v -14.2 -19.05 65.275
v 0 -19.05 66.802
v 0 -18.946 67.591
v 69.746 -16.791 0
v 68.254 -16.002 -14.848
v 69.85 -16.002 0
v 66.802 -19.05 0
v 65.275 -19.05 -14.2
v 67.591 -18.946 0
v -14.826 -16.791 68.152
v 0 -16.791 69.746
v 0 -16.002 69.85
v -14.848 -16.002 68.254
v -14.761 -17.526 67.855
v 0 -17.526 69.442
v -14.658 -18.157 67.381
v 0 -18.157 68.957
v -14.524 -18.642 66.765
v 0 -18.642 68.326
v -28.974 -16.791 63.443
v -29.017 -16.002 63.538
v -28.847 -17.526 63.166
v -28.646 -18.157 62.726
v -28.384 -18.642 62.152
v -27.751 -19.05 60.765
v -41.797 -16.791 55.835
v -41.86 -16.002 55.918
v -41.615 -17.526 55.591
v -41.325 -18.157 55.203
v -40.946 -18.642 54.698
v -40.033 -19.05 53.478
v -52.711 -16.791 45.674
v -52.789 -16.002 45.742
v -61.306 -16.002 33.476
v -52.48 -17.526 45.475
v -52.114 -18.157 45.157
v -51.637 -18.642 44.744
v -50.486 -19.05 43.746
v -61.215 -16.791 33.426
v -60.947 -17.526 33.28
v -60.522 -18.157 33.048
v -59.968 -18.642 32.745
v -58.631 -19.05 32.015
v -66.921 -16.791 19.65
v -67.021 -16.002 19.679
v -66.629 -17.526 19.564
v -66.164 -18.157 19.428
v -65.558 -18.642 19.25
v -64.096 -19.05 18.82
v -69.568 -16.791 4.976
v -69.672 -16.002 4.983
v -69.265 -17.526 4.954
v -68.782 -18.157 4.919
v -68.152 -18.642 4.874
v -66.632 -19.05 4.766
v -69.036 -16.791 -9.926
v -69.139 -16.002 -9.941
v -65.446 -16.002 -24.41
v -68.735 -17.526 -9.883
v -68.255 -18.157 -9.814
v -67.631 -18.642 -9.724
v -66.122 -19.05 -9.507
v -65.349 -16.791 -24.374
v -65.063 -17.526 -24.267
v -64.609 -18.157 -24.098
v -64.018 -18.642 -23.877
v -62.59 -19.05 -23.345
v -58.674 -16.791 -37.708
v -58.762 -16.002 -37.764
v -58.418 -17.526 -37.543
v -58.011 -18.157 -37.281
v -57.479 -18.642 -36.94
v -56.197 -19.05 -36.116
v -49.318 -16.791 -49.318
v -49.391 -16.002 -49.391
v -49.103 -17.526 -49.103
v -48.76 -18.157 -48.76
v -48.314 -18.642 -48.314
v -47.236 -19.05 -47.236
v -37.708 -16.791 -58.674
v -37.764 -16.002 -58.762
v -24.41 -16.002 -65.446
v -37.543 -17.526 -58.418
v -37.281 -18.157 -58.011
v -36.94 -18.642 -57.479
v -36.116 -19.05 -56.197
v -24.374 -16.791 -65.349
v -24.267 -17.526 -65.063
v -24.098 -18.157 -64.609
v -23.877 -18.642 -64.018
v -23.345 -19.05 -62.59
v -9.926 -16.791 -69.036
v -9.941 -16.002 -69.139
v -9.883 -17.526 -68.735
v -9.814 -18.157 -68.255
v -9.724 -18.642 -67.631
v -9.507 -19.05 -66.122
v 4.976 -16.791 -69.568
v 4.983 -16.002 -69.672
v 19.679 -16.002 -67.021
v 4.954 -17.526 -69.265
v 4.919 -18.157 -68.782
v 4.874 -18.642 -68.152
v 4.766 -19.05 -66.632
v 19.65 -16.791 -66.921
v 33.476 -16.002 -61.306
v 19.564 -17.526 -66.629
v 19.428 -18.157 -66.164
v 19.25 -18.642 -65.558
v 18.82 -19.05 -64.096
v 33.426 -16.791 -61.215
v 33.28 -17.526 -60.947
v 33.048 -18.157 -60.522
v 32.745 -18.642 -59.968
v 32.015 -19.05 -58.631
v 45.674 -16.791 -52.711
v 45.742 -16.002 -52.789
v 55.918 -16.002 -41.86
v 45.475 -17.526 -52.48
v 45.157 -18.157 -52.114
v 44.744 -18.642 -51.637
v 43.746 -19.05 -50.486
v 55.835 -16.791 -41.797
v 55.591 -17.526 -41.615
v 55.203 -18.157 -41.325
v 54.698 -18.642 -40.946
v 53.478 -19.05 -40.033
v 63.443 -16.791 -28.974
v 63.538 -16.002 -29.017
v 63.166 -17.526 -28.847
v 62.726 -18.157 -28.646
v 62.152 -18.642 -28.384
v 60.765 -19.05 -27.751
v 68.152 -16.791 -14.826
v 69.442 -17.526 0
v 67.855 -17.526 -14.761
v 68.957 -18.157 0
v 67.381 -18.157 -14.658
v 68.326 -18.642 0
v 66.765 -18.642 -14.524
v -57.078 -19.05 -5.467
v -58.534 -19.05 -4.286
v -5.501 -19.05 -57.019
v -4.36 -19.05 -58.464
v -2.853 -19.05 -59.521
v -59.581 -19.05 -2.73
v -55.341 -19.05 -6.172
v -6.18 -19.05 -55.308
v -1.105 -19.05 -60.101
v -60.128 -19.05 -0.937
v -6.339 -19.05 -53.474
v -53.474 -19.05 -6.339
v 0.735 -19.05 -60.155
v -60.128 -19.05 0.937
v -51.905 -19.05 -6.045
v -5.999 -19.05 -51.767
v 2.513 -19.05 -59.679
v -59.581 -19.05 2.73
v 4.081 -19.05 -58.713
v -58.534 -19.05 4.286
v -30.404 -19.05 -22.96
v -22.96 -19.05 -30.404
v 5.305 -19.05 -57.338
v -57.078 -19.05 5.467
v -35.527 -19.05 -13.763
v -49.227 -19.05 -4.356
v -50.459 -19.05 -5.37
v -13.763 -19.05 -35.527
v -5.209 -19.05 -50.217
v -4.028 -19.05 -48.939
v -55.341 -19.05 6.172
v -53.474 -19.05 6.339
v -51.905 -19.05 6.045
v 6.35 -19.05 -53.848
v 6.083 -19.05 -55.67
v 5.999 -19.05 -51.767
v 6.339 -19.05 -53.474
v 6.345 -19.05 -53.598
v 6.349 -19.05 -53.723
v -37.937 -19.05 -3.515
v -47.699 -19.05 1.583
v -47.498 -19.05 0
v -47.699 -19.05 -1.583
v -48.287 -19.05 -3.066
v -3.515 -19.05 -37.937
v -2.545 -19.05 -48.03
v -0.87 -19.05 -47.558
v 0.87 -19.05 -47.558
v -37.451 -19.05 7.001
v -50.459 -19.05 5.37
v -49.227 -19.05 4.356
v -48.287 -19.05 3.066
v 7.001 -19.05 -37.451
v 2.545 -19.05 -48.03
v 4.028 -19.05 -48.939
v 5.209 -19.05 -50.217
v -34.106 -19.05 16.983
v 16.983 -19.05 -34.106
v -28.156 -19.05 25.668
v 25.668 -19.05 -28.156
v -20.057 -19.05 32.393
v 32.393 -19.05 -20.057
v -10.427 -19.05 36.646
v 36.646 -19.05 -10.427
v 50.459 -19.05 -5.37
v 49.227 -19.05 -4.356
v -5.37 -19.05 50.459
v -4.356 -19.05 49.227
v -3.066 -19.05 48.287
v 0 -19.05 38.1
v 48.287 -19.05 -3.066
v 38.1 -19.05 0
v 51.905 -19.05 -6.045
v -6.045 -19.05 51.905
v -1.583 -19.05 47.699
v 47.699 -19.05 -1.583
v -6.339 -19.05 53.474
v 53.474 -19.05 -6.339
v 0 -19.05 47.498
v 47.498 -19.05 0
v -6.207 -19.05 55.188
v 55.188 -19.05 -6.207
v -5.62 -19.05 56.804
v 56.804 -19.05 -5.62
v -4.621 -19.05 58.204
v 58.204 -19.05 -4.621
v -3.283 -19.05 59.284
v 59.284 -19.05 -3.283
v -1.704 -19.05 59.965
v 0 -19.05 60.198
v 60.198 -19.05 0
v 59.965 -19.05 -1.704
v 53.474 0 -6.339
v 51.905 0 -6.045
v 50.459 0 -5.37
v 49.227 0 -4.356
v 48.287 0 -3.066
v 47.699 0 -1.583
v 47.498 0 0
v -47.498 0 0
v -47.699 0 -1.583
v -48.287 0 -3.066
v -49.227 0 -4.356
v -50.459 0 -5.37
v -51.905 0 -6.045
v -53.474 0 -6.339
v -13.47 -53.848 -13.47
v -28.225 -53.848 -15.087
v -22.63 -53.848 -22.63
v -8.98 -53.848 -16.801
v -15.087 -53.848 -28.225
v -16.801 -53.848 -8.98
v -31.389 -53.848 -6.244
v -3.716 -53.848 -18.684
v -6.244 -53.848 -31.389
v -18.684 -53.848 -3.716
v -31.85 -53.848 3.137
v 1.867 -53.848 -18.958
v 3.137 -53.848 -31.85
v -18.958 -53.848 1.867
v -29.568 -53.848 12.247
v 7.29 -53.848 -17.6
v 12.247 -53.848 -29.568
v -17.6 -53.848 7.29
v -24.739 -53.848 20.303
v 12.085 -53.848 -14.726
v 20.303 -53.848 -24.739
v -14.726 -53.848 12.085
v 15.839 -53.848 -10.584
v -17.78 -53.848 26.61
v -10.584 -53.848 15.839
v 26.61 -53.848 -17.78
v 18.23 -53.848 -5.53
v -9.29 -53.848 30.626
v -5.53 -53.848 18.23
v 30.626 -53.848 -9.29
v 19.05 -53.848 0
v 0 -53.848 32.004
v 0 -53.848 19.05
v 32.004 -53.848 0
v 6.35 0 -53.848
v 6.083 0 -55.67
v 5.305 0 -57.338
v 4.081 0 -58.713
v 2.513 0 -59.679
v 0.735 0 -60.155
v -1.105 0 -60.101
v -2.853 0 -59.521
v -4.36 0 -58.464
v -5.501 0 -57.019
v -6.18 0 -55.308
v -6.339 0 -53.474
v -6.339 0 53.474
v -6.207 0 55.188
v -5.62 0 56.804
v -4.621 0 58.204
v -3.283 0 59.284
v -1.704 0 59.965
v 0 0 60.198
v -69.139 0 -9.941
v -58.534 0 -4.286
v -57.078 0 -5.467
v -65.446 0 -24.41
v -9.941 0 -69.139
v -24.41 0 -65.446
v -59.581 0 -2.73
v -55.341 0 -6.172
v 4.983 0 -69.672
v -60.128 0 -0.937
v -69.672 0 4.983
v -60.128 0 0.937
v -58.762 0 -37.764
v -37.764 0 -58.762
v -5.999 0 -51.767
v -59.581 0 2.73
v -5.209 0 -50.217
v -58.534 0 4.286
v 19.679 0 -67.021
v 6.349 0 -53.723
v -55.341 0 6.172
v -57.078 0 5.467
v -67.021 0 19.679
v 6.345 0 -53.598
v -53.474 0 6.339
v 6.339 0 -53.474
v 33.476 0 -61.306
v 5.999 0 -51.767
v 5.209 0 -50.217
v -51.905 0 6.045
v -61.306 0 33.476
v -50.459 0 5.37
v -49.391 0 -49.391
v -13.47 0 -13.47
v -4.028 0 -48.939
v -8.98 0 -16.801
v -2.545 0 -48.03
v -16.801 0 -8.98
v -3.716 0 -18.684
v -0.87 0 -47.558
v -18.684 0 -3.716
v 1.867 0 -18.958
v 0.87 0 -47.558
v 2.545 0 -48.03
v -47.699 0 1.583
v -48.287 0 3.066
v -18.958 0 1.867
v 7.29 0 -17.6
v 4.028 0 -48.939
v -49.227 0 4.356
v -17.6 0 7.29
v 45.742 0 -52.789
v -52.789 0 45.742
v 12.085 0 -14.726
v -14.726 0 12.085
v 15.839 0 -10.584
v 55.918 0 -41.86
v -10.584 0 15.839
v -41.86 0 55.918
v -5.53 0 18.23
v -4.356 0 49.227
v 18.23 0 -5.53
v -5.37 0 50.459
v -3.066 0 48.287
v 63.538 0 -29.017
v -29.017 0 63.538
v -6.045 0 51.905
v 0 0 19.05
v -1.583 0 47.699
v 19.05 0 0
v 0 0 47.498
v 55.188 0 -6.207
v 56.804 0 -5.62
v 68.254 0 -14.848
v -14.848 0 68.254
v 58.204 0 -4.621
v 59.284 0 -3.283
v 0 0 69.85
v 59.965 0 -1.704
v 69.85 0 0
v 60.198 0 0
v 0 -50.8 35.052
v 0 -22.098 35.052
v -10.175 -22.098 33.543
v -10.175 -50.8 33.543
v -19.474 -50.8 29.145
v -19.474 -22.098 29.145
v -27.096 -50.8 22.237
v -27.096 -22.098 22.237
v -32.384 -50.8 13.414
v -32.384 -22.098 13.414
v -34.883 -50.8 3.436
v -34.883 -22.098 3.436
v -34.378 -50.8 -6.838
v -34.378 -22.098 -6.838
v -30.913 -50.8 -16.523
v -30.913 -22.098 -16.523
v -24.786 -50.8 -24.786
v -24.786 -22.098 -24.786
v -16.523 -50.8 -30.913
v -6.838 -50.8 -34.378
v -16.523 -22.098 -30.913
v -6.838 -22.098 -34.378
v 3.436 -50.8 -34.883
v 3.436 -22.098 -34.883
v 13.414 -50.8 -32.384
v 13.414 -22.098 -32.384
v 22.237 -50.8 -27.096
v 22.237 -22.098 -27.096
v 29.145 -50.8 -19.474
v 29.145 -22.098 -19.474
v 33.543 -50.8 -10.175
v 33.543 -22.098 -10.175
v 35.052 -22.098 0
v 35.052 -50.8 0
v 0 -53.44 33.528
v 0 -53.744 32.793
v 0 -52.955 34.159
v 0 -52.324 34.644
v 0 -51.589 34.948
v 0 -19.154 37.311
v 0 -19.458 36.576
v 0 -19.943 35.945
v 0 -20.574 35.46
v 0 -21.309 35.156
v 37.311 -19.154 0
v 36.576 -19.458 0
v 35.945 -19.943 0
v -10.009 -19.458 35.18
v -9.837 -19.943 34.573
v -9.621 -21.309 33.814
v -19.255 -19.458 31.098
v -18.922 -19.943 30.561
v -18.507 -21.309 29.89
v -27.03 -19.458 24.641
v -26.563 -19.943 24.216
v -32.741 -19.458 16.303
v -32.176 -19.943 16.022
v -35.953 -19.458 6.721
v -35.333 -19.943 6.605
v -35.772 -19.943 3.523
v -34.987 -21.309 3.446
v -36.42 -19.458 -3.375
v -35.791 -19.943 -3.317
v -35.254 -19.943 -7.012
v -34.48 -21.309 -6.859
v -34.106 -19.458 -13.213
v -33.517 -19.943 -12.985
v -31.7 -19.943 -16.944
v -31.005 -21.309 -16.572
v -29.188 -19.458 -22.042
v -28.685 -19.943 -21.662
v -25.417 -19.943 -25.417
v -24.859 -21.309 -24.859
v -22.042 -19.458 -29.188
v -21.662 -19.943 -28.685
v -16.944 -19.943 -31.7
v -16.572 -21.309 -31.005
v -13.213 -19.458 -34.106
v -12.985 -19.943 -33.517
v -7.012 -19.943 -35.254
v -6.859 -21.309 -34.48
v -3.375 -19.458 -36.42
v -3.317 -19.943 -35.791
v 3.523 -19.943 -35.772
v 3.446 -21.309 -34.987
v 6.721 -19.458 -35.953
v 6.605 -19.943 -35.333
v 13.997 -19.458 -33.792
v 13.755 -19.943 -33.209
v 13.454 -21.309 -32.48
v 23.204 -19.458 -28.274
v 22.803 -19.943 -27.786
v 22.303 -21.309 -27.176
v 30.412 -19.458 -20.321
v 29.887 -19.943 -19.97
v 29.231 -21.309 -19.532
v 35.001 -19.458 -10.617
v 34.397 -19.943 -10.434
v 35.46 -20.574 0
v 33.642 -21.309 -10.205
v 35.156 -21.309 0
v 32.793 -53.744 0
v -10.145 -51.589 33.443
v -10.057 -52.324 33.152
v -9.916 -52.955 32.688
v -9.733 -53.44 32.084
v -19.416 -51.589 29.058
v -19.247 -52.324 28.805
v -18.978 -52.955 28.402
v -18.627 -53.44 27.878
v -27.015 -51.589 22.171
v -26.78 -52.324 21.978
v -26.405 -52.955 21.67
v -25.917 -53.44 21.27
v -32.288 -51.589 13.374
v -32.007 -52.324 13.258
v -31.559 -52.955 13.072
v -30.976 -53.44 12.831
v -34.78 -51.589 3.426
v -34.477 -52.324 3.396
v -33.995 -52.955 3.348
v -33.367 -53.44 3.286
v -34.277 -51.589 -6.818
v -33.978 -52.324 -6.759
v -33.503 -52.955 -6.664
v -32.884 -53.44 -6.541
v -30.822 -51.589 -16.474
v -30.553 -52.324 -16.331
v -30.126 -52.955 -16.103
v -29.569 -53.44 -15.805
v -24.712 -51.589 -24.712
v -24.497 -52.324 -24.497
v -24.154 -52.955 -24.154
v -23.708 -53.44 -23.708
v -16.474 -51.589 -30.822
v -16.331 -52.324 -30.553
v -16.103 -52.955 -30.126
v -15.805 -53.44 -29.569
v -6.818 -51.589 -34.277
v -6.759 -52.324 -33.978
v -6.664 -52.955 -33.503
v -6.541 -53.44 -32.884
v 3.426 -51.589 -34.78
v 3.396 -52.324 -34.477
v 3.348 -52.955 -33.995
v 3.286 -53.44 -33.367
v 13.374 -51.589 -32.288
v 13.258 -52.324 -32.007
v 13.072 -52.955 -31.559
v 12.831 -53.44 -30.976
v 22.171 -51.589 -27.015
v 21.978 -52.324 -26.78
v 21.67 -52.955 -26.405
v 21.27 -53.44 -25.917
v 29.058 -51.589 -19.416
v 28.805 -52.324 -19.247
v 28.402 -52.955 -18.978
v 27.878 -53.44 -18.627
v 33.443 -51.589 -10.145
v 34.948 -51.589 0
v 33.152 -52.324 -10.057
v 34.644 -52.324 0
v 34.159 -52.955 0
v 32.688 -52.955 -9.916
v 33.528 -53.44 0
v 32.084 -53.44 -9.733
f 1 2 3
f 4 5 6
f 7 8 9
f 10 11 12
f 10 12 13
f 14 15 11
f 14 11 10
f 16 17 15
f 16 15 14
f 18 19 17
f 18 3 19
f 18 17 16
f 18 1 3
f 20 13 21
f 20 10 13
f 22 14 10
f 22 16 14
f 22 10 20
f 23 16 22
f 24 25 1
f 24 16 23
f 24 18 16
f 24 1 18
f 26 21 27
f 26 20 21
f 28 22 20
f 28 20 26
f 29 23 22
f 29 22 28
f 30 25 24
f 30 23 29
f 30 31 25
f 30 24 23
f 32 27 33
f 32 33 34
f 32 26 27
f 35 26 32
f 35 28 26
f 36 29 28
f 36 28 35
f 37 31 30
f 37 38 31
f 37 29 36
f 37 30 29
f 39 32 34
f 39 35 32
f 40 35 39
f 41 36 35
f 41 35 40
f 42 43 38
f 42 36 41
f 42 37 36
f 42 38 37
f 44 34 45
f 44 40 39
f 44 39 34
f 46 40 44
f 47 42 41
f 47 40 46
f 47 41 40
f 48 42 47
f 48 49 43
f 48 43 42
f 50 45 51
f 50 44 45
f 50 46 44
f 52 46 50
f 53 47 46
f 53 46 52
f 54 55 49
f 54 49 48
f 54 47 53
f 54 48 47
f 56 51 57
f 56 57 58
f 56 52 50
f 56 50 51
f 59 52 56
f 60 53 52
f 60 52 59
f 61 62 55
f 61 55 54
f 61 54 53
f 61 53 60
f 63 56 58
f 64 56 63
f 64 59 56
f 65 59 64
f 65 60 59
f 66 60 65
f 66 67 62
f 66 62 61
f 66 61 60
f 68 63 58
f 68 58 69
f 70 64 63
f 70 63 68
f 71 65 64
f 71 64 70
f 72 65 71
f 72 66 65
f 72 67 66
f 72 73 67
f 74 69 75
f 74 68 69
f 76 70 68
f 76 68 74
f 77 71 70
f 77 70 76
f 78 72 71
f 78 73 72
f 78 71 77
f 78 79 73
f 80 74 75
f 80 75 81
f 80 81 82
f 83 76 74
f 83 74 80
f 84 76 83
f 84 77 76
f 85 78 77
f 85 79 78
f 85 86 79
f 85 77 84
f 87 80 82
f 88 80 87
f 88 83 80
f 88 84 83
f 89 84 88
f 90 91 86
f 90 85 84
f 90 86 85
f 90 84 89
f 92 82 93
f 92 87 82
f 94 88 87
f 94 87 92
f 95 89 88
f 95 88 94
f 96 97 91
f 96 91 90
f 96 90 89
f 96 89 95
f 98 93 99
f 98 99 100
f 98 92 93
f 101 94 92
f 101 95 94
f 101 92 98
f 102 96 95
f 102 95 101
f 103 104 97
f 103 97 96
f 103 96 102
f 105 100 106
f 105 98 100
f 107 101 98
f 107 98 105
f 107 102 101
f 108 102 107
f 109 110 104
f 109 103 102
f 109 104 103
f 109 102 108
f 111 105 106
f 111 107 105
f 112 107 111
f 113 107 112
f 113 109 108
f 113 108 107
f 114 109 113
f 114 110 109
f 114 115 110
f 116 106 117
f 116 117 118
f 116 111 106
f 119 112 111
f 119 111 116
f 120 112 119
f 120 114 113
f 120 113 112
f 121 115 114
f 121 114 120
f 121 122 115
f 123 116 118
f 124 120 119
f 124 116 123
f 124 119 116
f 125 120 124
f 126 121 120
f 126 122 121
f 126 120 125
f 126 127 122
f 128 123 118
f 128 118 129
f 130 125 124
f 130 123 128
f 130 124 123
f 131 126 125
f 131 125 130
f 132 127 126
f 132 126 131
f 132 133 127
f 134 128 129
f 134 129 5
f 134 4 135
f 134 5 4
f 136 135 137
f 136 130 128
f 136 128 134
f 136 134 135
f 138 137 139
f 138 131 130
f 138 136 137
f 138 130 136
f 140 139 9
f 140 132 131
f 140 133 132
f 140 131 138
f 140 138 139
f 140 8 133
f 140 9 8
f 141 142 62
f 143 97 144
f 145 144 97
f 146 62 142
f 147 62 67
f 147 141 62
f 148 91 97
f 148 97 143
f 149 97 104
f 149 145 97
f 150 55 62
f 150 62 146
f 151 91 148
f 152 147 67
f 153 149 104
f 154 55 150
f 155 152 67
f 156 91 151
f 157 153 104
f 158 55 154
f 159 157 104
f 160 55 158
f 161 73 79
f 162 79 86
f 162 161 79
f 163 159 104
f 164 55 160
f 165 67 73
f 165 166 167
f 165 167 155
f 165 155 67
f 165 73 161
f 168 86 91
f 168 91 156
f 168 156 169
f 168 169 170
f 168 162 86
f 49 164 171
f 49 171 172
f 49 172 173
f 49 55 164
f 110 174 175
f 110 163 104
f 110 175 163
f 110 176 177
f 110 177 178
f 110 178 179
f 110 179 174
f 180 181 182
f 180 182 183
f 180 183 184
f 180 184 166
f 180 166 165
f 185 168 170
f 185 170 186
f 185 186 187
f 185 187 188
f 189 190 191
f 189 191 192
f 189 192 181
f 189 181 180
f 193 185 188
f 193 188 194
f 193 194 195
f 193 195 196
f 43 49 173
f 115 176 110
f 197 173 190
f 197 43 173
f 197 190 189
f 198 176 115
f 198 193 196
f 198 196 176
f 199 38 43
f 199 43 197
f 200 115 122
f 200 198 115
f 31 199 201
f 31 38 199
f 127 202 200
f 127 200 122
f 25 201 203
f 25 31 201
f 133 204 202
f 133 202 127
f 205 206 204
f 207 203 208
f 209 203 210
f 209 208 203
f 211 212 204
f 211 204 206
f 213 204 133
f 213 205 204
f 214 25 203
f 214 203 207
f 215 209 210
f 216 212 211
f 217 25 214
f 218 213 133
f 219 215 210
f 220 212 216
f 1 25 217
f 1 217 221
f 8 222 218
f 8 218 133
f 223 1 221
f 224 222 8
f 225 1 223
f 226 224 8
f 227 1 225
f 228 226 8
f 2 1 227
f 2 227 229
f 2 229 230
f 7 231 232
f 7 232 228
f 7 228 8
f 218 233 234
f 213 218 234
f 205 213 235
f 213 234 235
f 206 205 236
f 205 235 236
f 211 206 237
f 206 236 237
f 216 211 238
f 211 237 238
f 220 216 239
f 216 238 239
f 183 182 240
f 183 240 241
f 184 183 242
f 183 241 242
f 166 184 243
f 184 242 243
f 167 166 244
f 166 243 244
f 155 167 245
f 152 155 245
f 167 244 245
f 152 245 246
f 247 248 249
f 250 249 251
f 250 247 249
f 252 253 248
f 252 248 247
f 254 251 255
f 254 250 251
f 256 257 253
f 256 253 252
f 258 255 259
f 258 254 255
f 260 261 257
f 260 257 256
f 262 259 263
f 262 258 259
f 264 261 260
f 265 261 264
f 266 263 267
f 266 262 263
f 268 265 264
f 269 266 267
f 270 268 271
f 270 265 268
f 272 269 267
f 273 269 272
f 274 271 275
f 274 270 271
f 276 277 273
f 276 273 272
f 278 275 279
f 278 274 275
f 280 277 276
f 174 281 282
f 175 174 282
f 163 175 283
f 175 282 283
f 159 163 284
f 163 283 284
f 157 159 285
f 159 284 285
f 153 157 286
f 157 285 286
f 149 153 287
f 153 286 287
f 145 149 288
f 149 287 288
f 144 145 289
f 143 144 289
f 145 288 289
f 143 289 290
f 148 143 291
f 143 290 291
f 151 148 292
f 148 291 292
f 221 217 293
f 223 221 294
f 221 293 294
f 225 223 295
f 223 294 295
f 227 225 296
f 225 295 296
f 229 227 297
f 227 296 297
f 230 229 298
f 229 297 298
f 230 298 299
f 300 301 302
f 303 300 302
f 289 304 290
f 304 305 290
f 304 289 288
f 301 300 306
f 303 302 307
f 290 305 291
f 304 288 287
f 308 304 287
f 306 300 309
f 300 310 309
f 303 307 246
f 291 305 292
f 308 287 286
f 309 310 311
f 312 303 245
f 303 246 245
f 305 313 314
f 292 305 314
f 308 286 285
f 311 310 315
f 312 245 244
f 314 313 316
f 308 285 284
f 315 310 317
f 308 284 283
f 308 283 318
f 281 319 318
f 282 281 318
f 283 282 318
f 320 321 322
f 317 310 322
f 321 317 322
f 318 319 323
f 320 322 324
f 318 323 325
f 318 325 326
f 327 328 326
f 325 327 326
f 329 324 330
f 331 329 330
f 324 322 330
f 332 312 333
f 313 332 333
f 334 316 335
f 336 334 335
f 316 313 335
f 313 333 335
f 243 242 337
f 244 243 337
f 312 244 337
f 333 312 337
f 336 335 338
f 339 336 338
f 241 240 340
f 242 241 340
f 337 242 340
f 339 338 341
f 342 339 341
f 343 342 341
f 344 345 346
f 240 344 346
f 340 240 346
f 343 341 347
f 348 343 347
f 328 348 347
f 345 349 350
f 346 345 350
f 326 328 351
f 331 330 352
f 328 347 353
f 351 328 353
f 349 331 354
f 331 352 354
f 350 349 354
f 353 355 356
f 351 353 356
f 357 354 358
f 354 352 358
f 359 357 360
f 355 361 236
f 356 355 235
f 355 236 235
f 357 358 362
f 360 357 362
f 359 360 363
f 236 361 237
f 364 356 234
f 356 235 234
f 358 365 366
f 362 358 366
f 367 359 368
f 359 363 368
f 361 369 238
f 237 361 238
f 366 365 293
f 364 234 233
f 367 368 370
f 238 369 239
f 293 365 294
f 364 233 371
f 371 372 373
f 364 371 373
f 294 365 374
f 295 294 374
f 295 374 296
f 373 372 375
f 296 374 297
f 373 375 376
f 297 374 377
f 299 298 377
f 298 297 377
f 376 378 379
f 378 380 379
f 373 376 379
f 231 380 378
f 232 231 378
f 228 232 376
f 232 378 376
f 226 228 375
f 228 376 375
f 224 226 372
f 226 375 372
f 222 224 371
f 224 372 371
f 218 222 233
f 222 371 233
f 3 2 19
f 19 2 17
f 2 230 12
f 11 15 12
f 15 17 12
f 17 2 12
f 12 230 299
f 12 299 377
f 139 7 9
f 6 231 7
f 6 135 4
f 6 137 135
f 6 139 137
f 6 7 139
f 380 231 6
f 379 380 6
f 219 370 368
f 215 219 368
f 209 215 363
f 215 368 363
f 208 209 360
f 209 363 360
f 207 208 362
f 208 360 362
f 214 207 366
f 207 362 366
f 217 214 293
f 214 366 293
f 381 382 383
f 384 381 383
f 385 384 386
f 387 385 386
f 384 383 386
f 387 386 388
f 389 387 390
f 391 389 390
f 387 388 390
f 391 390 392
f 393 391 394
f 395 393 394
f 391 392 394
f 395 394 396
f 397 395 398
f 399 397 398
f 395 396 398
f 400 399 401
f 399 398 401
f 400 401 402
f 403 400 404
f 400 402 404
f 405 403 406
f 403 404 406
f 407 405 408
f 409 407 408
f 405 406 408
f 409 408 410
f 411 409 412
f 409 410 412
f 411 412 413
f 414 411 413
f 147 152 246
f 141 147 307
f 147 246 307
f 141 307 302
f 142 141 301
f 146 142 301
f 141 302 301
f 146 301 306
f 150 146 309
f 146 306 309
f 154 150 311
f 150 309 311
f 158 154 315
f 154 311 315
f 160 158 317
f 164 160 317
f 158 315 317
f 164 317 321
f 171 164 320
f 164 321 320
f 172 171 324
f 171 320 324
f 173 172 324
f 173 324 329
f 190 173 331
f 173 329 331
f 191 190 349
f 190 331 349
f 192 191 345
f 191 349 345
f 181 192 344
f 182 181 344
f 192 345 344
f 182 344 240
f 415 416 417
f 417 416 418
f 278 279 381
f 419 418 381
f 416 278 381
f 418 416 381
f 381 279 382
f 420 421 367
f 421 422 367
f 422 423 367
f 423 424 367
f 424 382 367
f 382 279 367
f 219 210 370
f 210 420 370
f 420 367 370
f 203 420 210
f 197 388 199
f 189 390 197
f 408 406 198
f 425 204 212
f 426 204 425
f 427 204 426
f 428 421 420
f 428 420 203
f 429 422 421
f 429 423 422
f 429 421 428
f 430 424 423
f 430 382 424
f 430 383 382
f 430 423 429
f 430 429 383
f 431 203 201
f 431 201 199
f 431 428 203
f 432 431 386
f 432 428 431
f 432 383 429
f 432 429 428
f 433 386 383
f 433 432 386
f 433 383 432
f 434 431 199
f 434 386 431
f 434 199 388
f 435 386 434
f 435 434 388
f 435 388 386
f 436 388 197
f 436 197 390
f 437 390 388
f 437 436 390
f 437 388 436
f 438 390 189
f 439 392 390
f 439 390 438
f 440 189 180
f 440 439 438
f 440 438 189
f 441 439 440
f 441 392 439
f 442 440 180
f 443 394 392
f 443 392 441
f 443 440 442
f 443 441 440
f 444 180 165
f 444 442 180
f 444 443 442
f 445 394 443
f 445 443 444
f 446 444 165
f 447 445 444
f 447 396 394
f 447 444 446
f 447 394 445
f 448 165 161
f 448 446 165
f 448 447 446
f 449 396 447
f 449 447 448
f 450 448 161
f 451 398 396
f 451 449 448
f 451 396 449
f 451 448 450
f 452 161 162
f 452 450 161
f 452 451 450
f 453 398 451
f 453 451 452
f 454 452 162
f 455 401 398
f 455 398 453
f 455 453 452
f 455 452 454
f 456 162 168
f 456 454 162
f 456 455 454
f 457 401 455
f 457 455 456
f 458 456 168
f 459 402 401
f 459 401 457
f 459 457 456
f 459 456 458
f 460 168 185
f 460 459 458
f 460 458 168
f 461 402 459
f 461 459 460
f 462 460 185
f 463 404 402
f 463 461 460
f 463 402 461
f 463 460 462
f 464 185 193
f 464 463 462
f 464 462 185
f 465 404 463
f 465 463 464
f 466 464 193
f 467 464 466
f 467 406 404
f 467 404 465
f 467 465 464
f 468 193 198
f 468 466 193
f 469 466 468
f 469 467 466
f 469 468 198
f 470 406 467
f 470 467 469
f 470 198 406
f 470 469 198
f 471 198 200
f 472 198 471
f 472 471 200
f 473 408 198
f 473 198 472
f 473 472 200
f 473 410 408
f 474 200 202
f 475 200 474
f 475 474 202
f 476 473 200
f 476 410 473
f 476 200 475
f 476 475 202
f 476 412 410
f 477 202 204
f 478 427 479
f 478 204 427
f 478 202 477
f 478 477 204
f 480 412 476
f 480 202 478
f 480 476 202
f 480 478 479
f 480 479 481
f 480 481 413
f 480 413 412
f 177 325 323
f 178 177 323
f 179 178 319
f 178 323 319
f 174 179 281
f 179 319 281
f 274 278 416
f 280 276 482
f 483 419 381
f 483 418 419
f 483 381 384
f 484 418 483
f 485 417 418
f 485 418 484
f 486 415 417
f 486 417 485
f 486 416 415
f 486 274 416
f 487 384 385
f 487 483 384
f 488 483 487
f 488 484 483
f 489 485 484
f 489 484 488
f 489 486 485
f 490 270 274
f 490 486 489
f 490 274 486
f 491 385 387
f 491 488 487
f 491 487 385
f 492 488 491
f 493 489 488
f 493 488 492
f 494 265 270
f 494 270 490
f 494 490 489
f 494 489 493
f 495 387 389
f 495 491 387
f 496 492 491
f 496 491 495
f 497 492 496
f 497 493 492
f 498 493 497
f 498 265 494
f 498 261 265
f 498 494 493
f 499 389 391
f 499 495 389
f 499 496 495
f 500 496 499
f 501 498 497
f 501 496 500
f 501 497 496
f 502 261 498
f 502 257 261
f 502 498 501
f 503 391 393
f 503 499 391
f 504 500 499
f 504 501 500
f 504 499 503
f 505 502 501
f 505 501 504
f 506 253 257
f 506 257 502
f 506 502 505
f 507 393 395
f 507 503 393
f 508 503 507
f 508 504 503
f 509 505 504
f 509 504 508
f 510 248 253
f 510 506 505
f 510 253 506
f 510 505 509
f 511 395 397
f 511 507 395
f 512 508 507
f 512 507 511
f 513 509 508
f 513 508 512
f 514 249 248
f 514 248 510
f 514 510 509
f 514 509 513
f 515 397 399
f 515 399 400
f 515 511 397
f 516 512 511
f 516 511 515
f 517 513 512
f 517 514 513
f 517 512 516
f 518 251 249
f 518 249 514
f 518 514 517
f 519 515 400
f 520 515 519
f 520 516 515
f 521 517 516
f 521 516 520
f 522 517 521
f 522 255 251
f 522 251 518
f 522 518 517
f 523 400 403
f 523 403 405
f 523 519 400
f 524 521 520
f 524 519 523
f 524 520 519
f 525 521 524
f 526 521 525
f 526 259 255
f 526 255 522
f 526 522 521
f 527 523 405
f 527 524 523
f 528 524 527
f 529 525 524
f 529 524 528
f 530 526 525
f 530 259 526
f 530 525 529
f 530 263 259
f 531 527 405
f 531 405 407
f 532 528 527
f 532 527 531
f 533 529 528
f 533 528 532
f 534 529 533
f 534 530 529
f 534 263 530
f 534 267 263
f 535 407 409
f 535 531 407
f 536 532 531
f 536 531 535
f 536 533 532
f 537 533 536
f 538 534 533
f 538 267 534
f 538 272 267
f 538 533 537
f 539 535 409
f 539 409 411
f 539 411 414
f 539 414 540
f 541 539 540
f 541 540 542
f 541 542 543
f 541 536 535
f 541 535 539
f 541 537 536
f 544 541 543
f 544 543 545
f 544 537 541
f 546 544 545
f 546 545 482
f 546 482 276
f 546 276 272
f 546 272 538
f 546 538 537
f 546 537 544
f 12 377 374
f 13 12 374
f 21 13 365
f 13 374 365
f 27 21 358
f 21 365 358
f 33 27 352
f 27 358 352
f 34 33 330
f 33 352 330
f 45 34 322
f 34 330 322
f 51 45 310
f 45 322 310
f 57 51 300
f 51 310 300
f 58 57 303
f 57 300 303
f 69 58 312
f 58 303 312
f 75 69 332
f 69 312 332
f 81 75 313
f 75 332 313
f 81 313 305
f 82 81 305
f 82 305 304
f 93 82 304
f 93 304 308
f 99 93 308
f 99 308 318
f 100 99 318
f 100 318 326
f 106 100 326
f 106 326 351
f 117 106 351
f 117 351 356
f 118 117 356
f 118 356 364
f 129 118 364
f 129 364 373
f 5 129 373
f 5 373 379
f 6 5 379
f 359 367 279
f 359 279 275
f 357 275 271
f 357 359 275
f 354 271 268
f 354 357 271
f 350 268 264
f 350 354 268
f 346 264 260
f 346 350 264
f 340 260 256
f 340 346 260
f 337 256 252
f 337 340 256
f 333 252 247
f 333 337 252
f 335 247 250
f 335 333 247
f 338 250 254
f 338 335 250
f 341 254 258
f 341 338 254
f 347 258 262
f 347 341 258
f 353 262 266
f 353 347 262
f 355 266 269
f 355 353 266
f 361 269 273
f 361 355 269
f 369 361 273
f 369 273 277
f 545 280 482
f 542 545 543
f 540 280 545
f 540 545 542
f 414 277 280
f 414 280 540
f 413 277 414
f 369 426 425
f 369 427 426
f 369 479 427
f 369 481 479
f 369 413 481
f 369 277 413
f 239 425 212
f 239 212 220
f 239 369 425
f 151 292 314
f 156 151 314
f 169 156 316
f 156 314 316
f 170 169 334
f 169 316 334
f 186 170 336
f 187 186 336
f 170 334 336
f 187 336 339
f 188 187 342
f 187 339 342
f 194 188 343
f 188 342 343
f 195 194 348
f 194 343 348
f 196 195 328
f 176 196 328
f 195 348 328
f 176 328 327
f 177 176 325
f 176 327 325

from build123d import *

# Parameters (mm, degrees)
F0_R     = 35.052
F0_R_2   = 19.05
F1_DEPTH = 53.848
F0_R_3   = 69.85
F2_DEPTH = 19.05
F3_W     = 73.3096525073
F3_H     = 72.7184489369
F4_DEPTH = 222
F5_W     = 74.8862102628
F5_H     = 75.4774138331
F6_DEPTH = 53.849
F7_R     = 3.048


# Not quite as in the source:
# - an extrude ends at something that could not be found from the text; its depth is read off the source's solid


with BuildPart() as f1:
    # F0 (on Front) → F1 (new body)
    with BuildSketch(Plane.XZ):
        Circle(F0_R)
        Circle(F0_R_2, mode=Mode.SUBTRACT)
    extrude(amount=F1_DEPTH)

    # F0 (on Front) → F2 (join)
    with BuildSketch(Plane.XZ):
        Circle(F0_R_3)
        with BuildLine():
            ThreePointArc((6.3389523479, 53.4735896226), (38.0762859533, 38.0762859533), (53.4735896226, 6.3389523479))
            ThreePointArc((53.4735896226, 6.3389523479), (58.2037429965, 4.6206063399), (60.198, 0))
            ThreePointArc((60.198, 0), (58.2037429965, -4.6206063399), (53.4735896226, -6.3389523479))
            ThreePointArc((53.4735896226, -6.3389523479), (38.0762859533, -38.0762859533), (6.3389523479, -53.4735896226))
            ThreePointArc((6.3389523479, -53.4735896226), (6.3472374861, -53.6607133338), (6.35, -53.848))
            ThreePointArc((6.35, -53.848), (-0.1872866662, -60.1952374861), (-6.3389523479, -53.4735896226))
            ThreePointArc((-6.3389523479, -53.4735896226), (-38.0762859533, -38.0762859533), (-53.4735896226, -6.3389523479))
            ThreePointArc((-53.4735896226, -6.3389523479), (-60.198, 0), (-53.4735896226, 6.3389523479))
            ThreePointArc((-53.4735896226, 6.3389523479), (-38.0762859533, 38.0762859533), (-6.3389523479, 53.4735896226))
            ThreePointArc((-6.3389523479, 53.4735896226), (-0.1872866662, 60.1952374861), (6.35, 53.848))
            ThreePointArc((6.35, 53.848), (6.3472374861, 53.6607133338), (6.3389523479, 53.4735896226))
        make_face(mode=Mode.SUBTRACT)
        with BuildLine():
            ThreePointArc((53.4735896226, -6.3389523479), (47.498, 0), (53.4735896226, 6.3389523479))
            ThreePointArc((53.4735896226, 6.3389523479), (38.0762859533, 38.0762859533), (6.3389523479, 53.4735896226))
            ThreePointArc((6.3389523479, 53.4735896226), (0, 47.498), (-6.3389523479, 53.4735896226))
            ThreePointArc((-6.3389523479, 53.4735896226), (-38.0762859533, 38.0762859533), (-53.4735896226, 6.3389523479))
            ThreePointArc((-53.4735896226, 6.3389523479), (-49.2273936601, 4.3557429965), (-47.498, 0))
            ThreePointArc((-47.498, 0), (-49.2273936601, -4.3557429965), (-53.4735896226, -6.3389523479))
            ThreePointArc((-53.4735896226, -6.3389523479), (-38.0762859533, -38.0762859533), (-6.3389523479, -53.4735896226))
            ThreePointArc((-6.3389523479, -53.4735896226), (0, -47.498), (6.3389523479, -53.4735896226))
            ThreePointArc((6.3389523479, -53.4735896226), (38.0762859533, -38.0762859533), (53.4735896226, -6.3389523479))
        make_face()
        Circle(F0_R, mode=Mode.SUBTRACT)
    extrude(amount=F2_DEPTH)

    # F3 (on Front) → F4 (cut, through all)
    with BuildSketch(Plane.XZ):
        with Locations((36.6548262537, 36.3592244685)):
            Rectangle(F3_W, F3_H)
    extrude(amount=-F4_DEPTH, mode=Mode.SUBTRACT)

    # F5 (on Front) → F6 (cut, through all)
    with BuildSketch(Plane.XZ):
        with Locations((37.4431051314, 37.7387069166)):
            Rectangle(F5_W, F5_H)
    extrude(amount=F6_DEPTH, mode=Mode.SUBTRACT)

    # F7
    f7_edges = [f1.edges().sort_by_distance(p)[0] for p in [
        (-24.785507, -53.848, -24.785507),
        (-24.785507, -19.05, -24.785507),
        (-49.391409, -19.05, -49.391409),
    ]]
    fillet(f7_edges, radius=F7_R)


solid = f1.part
